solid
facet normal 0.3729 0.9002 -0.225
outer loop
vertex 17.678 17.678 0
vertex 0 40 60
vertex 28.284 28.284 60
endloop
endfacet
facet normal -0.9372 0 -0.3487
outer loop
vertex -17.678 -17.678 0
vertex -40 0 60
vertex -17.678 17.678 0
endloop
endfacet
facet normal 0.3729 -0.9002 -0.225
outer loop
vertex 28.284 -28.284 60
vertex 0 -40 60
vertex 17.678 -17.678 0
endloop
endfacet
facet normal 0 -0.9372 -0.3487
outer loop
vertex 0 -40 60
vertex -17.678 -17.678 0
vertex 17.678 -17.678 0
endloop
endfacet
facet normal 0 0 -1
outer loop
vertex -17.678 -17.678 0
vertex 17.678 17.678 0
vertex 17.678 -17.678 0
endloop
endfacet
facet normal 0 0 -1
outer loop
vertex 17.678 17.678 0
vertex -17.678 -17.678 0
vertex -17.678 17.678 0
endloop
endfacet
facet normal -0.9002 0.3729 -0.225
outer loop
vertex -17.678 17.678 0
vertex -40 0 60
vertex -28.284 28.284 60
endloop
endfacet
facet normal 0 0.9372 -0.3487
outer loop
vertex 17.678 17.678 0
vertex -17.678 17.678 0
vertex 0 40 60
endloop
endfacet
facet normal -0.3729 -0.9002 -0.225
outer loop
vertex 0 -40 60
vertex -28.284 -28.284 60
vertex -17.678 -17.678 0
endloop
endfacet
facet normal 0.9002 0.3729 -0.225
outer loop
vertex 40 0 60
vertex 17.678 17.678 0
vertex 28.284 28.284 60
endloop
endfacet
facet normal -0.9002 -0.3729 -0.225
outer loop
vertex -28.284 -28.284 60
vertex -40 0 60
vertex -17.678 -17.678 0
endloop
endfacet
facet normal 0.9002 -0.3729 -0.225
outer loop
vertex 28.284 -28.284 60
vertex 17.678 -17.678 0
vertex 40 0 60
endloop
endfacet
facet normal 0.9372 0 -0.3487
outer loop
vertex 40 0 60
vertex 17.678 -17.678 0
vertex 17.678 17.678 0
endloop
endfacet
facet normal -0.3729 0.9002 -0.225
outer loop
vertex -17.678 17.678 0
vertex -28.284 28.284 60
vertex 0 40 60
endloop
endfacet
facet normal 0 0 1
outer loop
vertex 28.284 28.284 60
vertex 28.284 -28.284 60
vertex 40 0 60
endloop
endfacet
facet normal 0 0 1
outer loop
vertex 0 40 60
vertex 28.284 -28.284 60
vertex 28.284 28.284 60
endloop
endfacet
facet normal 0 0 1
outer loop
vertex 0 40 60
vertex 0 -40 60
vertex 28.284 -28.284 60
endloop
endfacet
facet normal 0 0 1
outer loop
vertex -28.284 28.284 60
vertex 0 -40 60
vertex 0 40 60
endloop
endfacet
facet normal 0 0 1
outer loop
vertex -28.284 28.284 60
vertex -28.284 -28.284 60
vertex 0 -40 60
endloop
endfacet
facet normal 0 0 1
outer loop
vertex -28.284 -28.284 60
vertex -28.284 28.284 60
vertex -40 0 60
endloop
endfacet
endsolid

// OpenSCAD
// [FL_INDEX: keywords="openscad, 3d_parametric, Customizable_Polygon_Morph_Vase, csg_solid" | COT="Parametric OpenSCAD design from 3DCodeverse"]
// Title: Customizable Polygon Morph Vase

// Customizable Polygon Morph Vase

use <MCAD/regular_shapes.scad>;

// Number of sides of bottom polygon
bottom_sides = 4;

// Circumradius of bottom polygon (mm from center to corner)
bottom_radius = 25;

// Number of sides of top polygon
top_sides = 8;

// Circumradius of top polygon (mm from center to corner)
top_radius = 40;

// Height of vase in millimeters
vase_height=60;

// Clockwise rotation of top relative to bottom in degrees
vase_twist=0;

// Keep the bottom at z 0 if the bottom is trimmed
translate([0, 0, bottom_radius > top_radius ? -1 : 0])

// Trim vertical extension from end with larger radius
difference() {
	
	// The convex hull of the top and bottom shape forms the body of the vase.
	hull() {
	
		// Bottom
		linear_extrude(height=1)
		reg_polygon(
			sides=bottom_sides,
			radius=bottom_radius);
	
		// Top
		translate([0, 0, vase_height])
		rotate([0, 0, -vase_twist])
		linear_extrude(height=1)
		reg_polygon(
			sides=top_sides,
			radius=top_radius);
	}
	
	if (bottom_radius > top_radius) {
		linear_extrude(height = 1) circle(r = bottom_radius + 1);
	} else {
		translate([0, 0, vase_height]) linear_extrude(height=2) circle(r = top_radius + 1);
	}
}
